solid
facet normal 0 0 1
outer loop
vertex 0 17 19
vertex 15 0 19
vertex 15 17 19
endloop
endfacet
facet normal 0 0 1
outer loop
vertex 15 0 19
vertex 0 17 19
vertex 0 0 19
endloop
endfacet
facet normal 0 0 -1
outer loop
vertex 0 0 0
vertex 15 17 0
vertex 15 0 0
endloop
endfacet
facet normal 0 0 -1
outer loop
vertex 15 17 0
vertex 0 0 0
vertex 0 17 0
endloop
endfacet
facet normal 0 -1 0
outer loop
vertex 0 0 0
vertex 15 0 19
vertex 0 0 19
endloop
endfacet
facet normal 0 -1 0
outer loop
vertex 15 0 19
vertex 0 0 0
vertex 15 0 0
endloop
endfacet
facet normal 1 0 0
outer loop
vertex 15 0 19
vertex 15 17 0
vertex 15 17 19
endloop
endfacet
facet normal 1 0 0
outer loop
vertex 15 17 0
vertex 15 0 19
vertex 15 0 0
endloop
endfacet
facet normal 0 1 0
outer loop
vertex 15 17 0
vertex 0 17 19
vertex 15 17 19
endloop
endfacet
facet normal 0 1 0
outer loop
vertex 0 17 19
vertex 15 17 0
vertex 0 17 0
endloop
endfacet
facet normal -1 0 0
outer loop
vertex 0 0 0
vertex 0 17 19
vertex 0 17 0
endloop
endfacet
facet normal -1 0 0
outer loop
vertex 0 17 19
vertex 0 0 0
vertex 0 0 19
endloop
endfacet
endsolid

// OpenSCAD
// Generated by SolidPython 1.0.1 on 2020-07-29 00:39:26


cube(size = [15, 17, 19]);
/***********************************************
*********      SolidPython code:      **********
************************************************
 
# import packages: SolidPython
from solid import *
from solid.utils import *
from itertools import chain, combinations


class Resize:

    def __init__(self, scad_file):
        self.scad_file = scad_file
        #self.scad_file = import_scad(scad_file)
        # cone/cylinder param:
        self.r1 = 0
        self.r2 = 0
        self.h = 0
        # rectangular prism param:
        self.w = 0
        self.l = 0
        # ellipse param:
        self.r = 0

    # import OpenScad code (file name corresponds to shape)


    # classify shape + parameters
    def assign(self, param1, param2, param3):
        if self.scad_file == 'cone.scad':
            self.r1 = param1
            self.r2 = param2
            self.h = param3
        elif self.scad_file == 'cylinder.scad':
            self.r1 = param1
            self.r2 = param2
            self.h = param3
        elif self.scad_file == 'rectangularPrism.scad':
            self.h = param1
            self.l = param2
            self.w = param3
        else:
            self.r = param1
            self.h = param2

    # resize parameters
    def iterate(self):
        x = range(3, 20, 2)
        i = 1
        if self.scad_file == 'cone.scad':
            tempList = list(combinations(x, 2))
            for temp in tempList:
                param1 = temp[0]
                param2 = temp[1]
                filepath = 'produced_scad_files/' + 'cone' + str(param1) + '_' + str(param2) + '_' + '.scad'
                scad_render_to_file(cylinder(h=param1, r1=param2, r2=0), filepath)

        elif self.scad_file == 'cylinder.scad':
            tempList = list(combinations(x, 3))
            for temp in tempList:
                param1 = temp[0]
                param2 = temp[1]
                filepath = 'produced_scad_files/' + 'cylinder' + str(param1) + '_' + str(param2) + '_' + '.scad'
                scad_render_to_file(cylinder(h=param1, r1=param2, r2=param2), filepath)

        elif self.scad_file == 'rectangularPrism.scad':
            tempList = list(combinations(x, 3))
            for temp in tempList:
                param1 = temp[0]
                param2 = temp[1]
                param3 = temp[2]
                filepath = 'produced_scad_files/' + 'rectangularPrism' + str(param1) + '_' + str(param2) + '_' + str(
                    param3) + '.scad'
                scad_render_to_file(cube(size=(param1, param2, param3)), filepath)

        elif self.scad_file == 'ellipse.scad':
            tempList = list(combinations(x, 4))
            for temp in tempList:
                param1 = temp[0]
                param2 = temp[1]
                param3 = temp[2]
                param4 = temp[3]
                filepath = 'produced_scad_files/' + 'ellipse' + str(param1) + '_' + str(param2) + '_' + str(param3) + '_' + str(param4) + '.scad'
                scad_render_to_file(scale([param1, param2, param3])(sphere(r=param4)), filepath)

    def render_to_scadfile(self):
        scad_render_to_file(scad, 'example.scad') 
 
************************************************/
